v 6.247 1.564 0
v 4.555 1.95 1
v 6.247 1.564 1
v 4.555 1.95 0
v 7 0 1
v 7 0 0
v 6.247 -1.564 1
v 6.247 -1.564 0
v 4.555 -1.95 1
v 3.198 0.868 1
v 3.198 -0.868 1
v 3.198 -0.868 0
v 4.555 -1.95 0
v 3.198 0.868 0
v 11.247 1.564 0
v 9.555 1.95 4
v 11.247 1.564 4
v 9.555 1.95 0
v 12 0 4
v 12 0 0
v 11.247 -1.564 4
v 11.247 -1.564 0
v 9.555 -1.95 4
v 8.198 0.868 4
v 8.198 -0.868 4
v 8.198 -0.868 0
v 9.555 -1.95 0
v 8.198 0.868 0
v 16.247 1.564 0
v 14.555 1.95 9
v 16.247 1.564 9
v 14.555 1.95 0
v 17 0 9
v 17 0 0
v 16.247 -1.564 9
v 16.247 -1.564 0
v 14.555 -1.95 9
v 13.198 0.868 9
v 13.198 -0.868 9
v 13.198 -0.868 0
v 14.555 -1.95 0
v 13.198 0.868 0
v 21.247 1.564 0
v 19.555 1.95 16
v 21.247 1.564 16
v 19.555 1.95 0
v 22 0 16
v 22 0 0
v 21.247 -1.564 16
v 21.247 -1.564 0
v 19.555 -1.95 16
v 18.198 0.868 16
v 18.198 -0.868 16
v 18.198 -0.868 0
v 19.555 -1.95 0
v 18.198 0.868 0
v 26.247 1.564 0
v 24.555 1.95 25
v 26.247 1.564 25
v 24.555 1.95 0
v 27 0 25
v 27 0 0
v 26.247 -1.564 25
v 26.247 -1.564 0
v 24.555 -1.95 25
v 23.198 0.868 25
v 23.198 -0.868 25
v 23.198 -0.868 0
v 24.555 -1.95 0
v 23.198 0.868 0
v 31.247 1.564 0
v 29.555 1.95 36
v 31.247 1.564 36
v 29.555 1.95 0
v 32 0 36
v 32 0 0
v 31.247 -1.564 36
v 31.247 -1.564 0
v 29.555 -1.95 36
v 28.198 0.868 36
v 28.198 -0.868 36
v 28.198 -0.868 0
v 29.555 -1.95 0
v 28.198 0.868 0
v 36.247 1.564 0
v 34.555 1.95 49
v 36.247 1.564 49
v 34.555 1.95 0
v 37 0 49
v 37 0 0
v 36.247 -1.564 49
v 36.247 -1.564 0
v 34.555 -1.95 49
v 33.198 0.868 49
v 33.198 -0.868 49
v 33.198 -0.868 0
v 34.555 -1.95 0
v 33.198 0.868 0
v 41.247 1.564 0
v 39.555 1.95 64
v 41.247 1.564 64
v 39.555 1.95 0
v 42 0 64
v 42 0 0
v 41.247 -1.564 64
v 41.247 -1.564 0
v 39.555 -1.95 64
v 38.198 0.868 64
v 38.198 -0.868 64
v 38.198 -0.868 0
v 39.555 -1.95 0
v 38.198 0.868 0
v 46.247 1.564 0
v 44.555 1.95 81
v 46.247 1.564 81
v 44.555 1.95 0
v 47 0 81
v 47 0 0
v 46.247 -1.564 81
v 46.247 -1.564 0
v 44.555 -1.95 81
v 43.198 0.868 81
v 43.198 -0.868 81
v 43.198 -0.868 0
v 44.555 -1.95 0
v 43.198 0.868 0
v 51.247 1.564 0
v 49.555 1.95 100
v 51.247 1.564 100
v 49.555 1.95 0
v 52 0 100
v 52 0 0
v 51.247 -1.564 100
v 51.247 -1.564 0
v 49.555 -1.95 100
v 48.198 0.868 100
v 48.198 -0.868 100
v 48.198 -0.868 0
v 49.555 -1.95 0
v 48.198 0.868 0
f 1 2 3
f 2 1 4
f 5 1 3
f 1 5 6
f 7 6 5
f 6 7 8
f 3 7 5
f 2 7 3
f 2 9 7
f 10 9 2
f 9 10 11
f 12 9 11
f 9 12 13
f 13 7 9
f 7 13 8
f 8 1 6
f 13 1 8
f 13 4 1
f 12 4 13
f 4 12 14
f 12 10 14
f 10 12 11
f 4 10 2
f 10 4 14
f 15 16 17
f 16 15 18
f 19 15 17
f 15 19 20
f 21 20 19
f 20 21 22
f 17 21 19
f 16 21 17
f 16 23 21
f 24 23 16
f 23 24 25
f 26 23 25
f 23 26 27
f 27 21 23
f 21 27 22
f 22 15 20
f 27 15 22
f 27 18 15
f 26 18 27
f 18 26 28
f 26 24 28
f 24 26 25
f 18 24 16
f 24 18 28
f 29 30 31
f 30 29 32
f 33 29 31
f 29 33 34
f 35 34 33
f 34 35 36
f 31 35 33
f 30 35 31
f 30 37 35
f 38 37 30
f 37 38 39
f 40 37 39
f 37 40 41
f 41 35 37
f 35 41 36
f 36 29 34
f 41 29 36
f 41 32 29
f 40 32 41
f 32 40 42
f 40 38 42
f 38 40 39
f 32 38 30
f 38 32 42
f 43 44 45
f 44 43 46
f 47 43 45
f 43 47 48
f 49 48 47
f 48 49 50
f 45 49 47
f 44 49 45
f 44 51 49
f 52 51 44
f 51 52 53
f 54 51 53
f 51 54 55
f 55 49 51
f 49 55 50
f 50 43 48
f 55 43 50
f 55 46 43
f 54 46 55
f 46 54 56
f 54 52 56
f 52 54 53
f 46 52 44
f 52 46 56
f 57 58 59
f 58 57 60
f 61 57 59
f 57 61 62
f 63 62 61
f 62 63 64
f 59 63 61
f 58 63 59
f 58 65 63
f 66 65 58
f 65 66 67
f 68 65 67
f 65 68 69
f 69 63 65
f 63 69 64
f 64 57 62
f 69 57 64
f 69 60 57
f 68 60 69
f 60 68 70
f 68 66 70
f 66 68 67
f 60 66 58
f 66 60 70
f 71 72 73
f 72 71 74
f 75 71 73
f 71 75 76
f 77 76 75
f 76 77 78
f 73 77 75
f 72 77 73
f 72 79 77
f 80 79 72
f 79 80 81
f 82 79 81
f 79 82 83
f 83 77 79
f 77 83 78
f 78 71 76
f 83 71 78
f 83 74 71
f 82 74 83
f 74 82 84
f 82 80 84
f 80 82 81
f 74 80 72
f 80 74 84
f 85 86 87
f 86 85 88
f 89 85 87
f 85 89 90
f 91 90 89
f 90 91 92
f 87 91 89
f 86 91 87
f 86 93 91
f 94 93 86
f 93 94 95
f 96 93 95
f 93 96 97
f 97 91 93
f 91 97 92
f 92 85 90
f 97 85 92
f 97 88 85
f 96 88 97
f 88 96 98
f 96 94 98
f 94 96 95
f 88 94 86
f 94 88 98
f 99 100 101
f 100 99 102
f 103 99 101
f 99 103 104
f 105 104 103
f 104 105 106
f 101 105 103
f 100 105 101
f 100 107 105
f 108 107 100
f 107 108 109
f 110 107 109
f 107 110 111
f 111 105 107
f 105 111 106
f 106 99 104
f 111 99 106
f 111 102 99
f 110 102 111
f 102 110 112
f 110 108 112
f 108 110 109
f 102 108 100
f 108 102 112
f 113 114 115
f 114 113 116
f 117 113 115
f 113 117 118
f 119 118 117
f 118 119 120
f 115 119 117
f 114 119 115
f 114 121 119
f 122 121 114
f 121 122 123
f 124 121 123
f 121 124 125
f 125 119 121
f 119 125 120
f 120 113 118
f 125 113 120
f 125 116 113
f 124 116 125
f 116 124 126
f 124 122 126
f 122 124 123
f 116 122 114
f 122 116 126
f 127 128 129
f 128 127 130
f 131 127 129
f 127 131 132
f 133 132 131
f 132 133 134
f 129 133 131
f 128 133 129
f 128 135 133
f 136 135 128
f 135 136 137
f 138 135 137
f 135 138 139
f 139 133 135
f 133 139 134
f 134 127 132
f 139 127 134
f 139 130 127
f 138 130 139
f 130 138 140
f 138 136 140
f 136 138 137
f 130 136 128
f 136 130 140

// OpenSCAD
for(i=[1:1:10]) {
	height=i*i;
	x=5*i;
	translate([x, 0, 0]) cylinder(h=height, r=2);
}
